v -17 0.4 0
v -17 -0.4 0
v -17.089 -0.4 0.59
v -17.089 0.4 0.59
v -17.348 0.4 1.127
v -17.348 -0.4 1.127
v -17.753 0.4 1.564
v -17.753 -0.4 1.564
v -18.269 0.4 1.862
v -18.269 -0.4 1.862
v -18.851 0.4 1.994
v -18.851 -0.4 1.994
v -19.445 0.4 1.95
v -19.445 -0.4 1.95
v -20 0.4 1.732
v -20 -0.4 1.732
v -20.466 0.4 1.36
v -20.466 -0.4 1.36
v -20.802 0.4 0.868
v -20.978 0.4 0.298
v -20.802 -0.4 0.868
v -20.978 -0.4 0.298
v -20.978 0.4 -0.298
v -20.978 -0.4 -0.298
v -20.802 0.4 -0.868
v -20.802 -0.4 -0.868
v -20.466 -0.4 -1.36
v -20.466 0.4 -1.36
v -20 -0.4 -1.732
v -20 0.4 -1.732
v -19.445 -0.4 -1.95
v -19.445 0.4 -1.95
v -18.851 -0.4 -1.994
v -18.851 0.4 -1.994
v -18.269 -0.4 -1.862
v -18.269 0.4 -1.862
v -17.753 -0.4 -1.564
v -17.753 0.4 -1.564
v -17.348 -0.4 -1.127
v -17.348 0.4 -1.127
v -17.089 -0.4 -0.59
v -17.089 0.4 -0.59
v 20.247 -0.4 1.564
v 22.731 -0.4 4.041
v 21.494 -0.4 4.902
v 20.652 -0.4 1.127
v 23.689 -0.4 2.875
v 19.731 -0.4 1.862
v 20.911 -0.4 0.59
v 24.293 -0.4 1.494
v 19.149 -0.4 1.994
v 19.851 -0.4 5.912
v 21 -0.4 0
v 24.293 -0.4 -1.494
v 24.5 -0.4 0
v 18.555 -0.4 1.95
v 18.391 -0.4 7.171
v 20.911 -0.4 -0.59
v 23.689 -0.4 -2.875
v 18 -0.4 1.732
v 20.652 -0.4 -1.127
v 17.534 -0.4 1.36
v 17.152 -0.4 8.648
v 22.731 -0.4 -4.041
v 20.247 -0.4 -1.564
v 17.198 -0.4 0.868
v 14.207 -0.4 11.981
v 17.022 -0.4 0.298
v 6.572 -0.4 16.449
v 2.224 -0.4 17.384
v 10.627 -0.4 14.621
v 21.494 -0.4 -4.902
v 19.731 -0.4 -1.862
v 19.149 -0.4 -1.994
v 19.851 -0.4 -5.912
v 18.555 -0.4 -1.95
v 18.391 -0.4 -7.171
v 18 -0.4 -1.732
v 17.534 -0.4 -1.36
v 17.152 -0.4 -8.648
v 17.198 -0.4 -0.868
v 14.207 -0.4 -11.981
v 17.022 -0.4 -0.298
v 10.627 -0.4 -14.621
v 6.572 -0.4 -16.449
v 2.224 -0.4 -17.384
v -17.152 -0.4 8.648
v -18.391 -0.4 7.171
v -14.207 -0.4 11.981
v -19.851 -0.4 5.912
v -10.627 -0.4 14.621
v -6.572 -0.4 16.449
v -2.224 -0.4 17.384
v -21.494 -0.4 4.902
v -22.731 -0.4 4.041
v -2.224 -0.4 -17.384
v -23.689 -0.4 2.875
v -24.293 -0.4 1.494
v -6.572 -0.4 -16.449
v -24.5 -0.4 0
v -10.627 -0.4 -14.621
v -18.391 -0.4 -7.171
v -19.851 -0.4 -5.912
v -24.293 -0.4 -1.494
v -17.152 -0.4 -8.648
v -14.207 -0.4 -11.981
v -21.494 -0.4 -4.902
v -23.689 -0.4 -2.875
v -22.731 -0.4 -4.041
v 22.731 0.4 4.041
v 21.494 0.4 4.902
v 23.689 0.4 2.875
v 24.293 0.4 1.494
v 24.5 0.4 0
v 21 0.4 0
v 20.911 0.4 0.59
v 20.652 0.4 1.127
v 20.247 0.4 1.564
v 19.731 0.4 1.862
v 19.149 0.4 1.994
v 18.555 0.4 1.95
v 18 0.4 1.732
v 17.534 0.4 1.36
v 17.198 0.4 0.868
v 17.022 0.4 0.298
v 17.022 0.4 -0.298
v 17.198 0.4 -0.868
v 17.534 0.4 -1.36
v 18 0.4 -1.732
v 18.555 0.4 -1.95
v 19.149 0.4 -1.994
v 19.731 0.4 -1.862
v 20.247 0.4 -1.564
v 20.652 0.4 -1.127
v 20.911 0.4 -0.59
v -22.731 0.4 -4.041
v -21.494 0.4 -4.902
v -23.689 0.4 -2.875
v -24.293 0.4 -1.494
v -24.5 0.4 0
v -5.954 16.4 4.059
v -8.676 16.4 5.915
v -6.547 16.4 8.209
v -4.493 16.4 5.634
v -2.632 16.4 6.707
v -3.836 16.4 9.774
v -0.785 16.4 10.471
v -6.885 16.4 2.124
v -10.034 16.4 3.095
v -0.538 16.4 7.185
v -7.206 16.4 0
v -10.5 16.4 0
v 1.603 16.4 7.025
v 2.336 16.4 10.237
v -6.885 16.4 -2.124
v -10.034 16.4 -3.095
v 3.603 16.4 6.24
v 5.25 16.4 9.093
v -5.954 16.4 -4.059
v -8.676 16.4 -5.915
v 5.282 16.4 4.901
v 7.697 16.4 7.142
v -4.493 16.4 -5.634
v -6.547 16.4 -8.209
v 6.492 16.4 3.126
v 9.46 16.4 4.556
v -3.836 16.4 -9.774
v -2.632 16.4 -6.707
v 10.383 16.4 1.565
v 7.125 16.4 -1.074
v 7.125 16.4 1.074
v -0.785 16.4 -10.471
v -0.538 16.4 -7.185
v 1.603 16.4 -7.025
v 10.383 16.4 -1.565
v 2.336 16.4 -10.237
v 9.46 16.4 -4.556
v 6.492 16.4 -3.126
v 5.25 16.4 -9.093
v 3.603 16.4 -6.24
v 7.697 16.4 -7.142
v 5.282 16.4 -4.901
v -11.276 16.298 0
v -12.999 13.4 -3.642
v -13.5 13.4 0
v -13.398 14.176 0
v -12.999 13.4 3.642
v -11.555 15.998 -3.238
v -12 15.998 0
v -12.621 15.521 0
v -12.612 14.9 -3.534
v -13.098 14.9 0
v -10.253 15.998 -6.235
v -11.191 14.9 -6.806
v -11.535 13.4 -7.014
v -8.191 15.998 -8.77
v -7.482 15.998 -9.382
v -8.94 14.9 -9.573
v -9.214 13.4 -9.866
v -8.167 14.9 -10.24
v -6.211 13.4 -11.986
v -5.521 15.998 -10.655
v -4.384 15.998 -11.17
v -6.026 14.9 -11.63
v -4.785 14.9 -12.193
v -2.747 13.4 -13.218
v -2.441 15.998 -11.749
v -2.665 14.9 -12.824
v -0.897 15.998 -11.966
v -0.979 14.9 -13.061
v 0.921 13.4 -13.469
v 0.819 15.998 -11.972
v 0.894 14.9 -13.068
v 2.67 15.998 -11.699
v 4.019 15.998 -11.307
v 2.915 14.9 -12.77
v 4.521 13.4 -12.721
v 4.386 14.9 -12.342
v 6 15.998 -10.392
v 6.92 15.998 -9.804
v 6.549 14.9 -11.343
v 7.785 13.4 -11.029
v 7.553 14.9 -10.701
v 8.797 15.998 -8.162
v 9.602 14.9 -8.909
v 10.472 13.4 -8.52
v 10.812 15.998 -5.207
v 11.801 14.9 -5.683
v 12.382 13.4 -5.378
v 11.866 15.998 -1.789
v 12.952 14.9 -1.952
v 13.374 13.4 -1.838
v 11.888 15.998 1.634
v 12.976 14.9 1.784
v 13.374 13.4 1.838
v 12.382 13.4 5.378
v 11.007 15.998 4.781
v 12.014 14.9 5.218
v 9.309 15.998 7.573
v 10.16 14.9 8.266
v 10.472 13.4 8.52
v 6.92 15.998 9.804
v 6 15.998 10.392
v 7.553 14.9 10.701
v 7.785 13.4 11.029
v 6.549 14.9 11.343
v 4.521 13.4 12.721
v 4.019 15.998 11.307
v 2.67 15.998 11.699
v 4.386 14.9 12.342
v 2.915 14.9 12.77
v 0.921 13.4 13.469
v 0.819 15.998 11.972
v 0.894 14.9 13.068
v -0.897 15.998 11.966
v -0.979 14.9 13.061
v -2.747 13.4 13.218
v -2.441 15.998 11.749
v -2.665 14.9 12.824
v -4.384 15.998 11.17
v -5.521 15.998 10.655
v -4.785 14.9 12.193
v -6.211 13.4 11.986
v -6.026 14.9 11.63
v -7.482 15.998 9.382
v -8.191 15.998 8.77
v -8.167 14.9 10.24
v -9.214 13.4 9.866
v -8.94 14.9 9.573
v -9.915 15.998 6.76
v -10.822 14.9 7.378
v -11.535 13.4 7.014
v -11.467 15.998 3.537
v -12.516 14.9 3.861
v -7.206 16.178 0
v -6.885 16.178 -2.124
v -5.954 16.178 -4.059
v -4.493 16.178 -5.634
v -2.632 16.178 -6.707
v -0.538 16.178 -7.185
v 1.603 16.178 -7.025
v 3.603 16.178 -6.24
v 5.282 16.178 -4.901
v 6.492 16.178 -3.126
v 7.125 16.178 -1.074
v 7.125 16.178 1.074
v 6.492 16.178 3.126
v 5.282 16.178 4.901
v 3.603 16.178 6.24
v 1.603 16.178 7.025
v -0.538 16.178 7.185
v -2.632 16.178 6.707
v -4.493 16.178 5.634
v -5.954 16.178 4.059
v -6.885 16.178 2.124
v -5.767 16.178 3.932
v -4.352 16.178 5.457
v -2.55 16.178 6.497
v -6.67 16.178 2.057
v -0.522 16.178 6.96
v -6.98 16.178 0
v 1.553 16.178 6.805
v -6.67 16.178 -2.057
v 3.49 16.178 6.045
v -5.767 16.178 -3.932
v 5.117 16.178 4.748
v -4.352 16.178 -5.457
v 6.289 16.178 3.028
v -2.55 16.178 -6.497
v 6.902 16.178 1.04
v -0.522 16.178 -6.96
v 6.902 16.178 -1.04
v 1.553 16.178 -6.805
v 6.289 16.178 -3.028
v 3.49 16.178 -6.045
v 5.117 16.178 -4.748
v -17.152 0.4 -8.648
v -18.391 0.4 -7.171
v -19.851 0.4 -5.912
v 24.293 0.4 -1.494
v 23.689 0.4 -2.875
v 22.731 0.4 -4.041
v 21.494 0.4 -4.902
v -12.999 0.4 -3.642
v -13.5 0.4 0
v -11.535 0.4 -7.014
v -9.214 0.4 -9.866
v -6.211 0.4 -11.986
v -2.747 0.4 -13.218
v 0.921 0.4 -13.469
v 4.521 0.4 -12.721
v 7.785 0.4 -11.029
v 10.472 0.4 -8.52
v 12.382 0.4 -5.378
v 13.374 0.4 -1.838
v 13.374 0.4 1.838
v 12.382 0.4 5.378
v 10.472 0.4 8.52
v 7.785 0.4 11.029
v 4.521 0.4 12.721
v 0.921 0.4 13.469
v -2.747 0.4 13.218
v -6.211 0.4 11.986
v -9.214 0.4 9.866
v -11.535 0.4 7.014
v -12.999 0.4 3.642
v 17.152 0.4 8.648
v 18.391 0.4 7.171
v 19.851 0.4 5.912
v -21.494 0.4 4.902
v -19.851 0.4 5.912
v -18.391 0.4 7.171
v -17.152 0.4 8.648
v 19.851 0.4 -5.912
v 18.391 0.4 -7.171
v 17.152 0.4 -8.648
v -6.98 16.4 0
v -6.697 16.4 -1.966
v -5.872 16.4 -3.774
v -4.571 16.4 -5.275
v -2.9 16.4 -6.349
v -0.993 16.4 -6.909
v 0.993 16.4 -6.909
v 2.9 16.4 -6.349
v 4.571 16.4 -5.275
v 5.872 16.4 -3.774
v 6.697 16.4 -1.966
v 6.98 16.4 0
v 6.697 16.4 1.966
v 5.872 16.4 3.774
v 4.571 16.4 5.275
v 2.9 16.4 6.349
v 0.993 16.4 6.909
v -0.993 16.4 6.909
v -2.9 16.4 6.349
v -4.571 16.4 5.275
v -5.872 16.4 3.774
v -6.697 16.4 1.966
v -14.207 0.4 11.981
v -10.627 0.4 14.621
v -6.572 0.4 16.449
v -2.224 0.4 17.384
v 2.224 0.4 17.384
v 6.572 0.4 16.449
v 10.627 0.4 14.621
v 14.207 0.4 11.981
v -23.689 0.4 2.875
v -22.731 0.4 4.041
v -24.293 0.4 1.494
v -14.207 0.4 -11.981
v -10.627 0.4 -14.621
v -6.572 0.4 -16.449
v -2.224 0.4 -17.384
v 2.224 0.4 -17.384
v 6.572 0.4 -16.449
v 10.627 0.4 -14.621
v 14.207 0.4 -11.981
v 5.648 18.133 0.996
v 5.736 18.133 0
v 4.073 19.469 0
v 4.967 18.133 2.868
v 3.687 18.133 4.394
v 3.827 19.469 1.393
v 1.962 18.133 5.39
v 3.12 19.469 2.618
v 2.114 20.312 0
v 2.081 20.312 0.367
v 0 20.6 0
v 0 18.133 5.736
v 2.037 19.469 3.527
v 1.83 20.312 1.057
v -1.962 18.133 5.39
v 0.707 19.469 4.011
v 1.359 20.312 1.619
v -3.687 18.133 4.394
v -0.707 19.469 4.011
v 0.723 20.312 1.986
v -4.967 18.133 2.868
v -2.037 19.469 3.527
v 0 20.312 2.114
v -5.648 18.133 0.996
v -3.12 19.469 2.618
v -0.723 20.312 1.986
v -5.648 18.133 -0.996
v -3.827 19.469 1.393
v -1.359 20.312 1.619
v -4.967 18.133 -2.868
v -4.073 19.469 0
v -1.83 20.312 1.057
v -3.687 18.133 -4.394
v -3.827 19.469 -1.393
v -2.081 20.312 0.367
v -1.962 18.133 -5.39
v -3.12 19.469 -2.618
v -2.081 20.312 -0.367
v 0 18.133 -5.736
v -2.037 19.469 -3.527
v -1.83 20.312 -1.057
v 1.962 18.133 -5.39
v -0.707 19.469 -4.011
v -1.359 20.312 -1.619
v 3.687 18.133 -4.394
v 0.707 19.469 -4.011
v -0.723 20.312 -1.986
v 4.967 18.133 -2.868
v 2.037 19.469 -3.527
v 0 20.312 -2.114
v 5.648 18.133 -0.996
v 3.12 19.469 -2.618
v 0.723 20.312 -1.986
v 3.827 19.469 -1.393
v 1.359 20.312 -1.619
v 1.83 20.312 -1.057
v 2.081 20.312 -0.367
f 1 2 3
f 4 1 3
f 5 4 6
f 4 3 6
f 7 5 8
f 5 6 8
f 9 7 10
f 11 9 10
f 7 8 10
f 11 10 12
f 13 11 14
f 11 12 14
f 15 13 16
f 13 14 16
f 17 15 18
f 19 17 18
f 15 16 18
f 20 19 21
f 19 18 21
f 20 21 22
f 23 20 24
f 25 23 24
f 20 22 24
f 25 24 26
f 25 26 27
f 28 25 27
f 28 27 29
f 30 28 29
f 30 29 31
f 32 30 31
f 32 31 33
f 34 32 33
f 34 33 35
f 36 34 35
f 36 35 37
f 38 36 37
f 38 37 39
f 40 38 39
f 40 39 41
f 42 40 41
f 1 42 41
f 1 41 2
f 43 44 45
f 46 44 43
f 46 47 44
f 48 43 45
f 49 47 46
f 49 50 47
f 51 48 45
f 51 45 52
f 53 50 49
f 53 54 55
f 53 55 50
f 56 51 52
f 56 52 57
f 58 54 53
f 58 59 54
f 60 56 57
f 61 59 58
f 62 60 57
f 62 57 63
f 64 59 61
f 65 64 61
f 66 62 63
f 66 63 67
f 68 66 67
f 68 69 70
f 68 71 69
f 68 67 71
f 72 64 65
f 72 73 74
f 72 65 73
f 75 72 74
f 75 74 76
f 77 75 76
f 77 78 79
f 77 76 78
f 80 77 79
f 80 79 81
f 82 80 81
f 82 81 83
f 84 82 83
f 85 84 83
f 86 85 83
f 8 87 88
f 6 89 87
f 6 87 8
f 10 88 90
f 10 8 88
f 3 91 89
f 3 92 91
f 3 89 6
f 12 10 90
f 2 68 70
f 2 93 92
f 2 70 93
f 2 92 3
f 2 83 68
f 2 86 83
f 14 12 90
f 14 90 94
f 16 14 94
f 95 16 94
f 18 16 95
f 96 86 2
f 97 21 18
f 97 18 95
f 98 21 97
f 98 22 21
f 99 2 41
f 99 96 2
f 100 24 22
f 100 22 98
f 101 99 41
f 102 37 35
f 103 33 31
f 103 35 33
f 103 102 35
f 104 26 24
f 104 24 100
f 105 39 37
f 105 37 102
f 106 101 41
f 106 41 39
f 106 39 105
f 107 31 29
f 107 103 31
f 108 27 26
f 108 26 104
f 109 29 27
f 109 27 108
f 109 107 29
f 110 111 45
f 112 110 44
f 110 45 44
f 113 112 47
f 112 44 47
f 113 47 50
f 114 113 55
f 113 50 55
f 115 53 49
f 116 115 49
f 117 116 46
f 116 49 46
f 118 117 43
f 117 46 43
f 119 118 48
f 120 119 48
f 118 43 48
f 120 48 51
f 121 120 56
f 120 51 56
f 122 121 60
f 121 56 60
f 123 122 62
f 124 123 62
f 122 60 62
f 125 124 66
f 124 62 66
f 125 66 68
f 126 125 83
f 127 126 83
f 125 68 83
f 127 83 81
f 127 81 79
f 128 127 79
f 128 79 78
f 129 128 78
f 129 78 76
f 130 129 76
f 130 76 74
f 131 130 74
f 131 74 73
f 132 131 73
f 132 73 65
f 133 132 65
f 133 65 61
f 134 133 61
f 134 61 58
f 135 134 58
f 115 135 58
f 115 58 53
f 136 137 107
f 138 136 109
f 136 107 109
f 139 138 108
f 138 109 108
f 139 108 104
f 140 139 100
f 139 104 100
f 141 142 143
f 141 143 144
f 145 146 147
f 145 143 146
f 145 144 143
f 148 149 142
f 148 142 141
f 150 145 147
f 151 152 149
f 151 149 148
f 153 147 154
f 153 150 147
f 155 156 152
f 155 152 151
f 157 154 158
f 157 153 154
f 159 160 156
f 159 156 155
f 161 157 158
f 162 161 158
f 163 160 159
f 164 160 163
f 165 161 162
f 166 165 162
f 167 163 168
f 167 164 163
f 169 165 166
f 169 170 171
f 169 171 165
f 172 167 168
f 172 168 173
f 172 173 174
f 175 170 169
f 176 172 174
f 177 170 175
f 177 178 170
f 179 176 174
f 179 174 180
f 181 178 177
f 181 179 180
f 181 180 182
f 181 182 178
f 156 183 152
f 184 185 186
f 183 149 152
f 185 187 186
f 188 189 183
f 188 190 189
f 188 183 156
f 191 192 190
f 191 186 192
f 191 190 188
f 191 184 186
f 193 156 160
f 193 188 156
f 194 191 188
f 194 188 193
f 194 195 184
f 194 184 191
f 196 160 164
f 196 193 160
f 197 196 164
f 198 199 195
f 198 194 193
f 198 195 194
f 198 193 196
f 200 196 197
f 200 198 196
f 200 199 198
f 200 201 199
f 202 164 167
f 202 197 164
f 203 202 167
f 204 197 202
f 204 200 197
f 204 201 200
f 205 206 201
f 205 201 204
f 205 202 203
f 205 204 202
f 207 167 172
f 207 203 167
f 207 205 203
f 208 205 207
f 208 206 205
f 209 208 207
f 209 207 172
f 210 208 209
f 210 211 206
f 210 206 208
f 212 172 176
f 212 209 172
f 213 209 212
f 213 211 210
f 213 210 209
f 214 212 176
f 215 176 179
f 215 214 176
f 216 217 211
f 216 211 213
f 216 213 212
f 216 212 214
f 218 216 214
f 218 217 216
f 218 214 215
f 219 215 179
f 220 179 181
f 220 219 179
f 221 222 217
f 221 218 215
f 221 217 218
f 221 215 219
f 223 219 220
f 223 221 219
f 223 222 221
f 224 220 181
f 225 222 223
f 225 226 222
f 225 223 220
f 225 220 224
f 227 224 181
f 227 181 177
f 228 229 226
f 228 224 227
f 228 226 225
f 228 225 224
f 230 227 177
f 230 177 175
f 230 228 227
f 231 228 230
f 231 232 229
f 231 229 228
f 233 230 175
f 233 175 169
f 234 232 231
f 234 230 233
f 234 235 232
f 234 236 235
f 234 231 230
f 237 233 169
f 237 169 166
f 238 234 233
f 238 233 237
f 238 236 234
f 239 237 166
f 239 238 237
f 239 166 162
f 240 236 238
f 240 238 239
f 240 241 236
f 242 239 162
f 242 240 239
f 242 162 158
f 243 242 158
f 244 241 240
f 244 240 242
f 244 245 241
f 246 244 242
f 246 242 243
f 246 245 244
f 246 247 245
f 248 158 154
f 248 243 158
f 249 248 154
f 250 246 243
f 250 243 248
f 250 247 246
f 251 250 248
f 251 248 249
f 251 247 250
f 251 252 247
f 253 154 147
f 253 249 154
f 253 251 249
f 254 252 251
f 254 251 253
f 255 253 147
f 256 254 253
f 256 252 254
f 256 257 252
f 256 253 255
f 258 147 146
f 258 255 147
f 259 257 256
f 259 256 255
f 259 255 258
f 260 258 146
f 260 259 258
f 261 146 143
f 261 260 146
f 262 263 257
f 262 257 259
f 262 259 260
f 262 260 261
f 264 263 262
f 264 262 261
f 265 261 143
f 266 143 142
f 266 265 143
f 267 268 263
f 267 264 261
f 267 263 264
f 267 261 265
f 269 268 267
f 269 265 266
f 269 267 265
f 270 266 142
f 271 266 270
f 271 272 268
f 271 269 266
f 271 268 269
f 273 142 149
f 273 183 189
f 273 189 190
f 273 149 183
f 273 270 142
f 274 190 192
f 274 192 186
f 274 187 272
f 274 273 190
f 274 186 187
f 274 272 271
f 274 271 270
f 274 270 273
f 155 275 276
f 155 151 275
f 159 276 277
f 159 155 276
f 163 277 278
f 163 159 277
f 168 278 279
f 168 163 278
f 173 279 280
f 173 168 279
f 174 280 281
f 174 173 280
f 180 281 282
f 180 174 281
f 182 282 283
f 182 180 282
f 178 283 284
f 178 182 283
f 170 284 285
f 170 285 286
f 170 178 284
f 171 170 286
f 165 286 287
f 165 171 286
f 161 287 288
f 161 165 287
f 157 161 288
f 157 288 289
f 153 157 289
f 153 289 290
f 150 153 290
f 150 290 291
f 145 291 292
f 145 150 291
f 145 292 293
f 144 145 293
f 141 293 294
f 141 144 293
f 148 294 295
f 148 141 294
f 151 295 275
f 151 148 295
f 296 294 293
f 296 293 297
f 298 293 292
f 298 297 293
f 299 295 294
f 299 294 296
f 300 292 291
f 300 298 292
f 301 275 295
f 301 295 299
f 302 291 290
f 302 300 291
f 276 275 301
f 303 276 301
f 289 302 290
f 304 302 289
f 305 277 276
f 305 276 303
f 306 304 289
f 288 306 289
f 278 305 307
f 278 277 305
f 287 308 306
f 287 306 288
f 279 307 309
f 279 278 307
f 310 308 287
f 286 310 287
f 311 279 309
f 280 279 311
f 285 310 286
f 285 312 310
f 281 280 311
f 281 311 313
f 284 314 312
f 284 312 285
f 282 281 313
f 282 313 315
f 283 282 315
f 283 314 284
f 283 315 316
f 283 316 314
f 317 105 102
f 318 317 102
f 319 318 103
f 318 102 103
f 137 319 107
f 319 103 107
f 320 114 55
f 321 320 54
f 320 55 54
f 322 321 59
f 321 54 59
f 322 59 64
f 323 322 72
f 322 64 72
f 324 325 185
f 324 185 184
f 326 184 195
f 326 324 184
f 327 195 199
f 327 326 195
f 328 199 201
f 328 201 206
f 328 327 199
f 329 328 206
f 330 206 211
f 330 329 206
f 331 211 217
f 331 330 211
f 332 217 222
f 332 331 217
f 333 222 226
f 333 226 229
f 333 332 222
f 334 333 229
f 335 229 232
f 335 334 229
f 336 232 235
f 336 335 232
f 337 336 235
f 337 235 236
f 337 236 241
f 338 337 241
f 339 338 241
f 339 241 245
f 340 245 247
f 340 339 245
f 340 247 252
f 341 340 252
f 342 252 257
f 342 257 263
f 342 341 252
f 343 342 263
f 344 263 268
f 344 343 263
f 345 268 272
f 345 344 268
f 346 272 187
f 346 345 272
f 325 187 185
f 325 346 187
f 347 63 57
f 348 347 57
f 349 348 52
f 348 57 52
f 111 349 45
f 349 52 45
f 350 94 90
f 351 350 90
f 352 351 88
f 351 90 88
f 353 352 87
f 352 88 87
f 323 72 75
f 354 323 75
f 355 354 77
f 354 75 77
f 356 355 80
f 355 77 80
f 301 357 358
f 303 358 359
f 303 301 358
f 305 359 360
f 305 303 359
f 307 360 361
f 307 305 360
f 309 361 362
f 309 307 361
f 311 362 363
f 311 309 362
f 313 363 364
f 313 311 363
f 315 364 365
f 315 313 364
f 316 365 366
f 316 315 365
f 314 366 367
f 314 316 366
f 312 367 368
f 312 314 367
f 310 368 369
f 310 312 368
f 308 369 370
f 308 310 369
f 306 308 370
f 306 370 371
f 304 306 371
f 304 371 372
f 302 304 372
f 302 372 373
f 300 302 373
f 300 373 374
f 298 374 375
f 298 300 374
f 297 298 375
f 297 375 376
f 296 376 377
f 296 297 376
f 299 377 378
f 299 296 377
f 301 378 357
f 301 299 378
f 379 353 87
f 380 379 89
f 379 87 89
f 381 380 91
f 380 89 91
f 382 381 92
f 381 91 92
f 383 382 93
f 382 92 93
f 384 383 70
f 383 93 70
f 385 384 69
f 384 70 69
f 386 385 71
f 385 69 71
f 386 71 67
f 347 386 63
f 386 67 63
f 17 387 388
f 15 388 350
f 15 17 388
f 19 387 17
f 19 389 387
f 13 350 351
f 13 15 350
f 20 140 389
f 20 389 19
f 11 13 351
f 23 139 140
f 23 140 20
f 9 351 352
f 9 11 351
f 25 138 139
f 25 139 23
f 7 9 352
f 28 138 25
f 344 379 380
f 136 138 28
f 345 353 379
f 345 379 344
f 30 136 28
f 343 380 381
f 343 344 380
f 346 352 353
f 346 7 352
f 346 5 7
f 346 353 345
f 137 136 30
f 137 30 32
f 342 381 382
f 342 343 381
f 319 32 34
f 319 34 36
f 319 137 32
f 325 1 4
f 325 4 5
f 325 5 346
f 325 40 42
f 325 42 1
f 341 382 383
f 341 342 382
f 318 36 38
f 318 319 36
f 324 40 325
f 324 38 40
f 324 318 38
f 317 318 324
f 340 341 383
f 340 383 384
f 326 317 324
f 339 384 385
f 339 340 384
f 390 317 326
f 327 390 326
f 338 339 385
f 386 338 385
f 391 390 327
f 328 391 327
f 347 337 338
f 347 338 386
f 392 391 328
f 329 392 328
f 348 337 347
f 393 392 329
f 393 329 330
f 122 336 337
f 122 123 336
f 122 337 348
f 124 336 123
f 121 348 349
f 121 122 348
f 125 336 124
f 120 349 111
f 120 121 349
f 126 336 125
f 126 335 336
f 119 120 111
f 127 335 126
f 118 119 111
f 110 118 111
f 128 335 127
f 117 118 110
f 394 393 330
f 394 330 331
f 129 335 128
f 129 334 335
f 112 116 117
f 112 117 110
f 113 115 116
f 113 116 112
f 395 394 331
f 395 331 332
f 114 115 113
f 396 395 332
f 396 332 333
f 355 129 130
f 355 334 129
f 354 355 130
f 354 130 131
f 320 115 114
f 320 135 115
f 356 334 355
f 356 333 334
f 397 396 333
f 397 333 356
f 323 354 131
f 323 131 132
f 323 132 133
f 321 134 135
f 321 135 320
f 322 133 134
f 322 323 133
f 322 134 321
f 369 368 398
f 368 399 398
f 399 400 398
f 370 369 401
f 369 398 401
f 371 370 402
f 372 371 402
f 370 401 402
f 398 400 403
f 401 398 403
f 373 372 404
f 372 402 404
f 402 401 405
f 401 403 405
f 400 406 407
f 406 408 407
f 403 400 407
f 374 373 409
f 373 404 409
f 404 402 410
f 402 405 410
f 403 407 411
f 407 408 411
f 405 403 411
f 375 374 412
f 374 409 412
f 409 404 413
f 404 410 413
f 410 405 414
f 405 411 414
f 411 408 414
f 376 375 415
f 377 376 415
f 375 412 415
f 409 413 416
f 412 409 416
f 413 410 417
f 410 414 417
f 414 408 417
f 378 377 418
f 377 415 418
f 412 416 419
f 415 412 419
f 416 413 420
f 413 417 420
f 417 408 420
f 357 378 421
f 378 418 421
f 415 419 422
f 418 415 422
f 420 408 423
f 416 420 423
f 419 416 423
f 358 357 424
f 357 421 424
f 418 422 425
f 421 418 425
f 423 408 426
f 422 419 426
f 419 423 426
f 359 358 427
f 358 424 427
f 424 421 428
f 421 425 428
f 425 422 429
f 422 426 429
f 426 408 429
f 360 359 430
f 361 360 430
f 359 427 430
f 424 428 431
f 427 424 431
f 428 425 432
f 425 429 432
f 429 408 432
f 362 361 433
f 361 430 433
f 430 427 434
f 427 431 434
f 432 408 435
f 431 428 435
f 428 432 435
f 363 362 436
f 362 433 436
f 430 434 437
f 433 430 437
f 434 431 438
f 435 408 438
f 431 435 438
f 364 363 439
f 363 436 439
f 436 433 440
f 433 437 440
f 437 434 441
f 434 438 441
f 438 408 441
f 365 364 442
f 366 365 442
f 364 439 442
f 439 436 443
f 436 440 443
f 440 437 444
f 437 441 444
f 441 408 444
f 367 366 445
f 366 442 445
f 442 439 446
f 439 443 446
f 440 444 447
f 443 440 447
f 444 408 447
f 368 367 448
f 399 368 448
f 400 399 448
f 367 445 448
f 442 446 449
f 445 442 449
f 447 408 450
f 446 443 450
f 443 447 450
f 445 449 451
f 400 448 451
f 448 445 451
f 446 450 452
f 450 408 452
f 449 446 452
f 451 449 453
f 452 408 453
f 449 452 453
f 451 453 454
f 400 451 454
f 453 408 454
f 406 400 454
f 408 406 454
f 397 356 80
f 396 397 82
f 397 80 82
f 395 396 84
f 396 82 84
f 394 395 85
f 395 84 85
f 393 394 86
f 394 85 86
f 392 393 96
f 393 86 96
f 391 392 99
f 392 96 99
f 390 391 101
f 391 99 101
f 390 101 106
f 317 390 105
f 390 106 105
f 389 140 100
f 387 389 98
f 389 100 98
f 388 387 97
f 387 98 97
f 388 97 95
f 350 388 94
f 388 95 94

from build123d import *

# Parameters (mm, degrees)
FILLET_1_R          = 3
SKETCH_2_R          = 2
CUT_EXTRUDE_1_DEPTH = 10


with BuildPart() as part:
    # 草图1 → 旋转1 (revolve)
    with BuildSketch(Plane.XY):
        Polygon((0, -0.4), (0, 16.4), (-6.979971347, 16.4), (-6.979971347, 16.177681197), (-7.205553414, 16.177681197), (-7.205553414, 16.4), (-13.5, 16.4), (-13.5, 0.4), (-24.5, 0.4), (-24.5, -0.4), align=None)
    revolve(axis=Axis((0, 20.6, 0), (0, -1, 0)))

    # 草图1<3> → 旋转2 (revolve)
    with BuildSketch(Plane.XY):
        with BuildLine():
            Line((-6.979971347, 16.4), (0, 16.4))
            Line((0, 16.4), (0, 20.6))
            ThreePointArc((0, 20.6), (-4.073082371, 19.4690472), (-6.979971347, 16.4))
        make_face()
    revolve(axis=Axis((0, 20.6, 0), (0, -1, 0)))

    # 圆角1
    fillet_1_edges = [part.edges().sort_by_distance(p)[0] for p in [
        (13.5, 16.4, 0),
    ]]
    fillet(fillet_1_edges, radius=FILLET_1_R)

    # 草图2 → 切除-拉伸1 (cut)
    with BuildSketch(Plane.XZ.offset(0.4)):
        with Locations((-19, 0)):
            Circle(SKETCH_2_R)
        with Locations((19, 0)):
            Circle(SKETCH_2_R)
        with BuildLine():
            ThreePointArc((21.493704912, 4.90218684), (23.688569985, 2.875293288), (24.5, 0))
            ThreePointArc((24.5, 0), (0, 24.5), (-24.5, 0))
            ThreePointArc((-24.5, 0), (-23.688569985, 2.875293288), (-21.493704912, 4.90218684))
            ThreePointArc((-21.493704912, 4.90218684), (-19.095836123, 6.511883307), (-17.152006375, 8.647866302))
            ThreePointArc((-17.152006375, 8.647866302), (0, 17.502201551), (17.152006375, 8.647866302))
            ThreePointArc((17.152006375, 8.647866302), (19.095836123, 6.511883307), (21.493704912, 4.90218684))
        make_face()
        with BuildLine():
            ThreePointArc((-24.5, 0), (0, -24.5), (24.5, 0))
            ThreePointArc((24.5, 0), (23.688569985, -2.875293288), (21.493704912, -4.90218684))
            ThreePointArc((21.493704912, -4.90218684), (19.095836123, -6.511883307), (17.152006375, -8.647866302))
            ThreePointArc((17.152006375, -8.647866302), (0, -17.502201551), (-17.152006375, -8.647866302))
            ThreePointArc((-17.152006375, -8.647866302), (-19.095836123, -6.511883307), (-21.493704912, -4.90218684))
            ThreePointArc((-21.493704912, -4.90218684), (-23.688569985, -2.875293288), (-24.5, 0))
        make_face()
    extrude(amount=-CUT_EXTRUDE_1_DEPTH, mode=Mode.SUBTRACT)


solid = part.part
